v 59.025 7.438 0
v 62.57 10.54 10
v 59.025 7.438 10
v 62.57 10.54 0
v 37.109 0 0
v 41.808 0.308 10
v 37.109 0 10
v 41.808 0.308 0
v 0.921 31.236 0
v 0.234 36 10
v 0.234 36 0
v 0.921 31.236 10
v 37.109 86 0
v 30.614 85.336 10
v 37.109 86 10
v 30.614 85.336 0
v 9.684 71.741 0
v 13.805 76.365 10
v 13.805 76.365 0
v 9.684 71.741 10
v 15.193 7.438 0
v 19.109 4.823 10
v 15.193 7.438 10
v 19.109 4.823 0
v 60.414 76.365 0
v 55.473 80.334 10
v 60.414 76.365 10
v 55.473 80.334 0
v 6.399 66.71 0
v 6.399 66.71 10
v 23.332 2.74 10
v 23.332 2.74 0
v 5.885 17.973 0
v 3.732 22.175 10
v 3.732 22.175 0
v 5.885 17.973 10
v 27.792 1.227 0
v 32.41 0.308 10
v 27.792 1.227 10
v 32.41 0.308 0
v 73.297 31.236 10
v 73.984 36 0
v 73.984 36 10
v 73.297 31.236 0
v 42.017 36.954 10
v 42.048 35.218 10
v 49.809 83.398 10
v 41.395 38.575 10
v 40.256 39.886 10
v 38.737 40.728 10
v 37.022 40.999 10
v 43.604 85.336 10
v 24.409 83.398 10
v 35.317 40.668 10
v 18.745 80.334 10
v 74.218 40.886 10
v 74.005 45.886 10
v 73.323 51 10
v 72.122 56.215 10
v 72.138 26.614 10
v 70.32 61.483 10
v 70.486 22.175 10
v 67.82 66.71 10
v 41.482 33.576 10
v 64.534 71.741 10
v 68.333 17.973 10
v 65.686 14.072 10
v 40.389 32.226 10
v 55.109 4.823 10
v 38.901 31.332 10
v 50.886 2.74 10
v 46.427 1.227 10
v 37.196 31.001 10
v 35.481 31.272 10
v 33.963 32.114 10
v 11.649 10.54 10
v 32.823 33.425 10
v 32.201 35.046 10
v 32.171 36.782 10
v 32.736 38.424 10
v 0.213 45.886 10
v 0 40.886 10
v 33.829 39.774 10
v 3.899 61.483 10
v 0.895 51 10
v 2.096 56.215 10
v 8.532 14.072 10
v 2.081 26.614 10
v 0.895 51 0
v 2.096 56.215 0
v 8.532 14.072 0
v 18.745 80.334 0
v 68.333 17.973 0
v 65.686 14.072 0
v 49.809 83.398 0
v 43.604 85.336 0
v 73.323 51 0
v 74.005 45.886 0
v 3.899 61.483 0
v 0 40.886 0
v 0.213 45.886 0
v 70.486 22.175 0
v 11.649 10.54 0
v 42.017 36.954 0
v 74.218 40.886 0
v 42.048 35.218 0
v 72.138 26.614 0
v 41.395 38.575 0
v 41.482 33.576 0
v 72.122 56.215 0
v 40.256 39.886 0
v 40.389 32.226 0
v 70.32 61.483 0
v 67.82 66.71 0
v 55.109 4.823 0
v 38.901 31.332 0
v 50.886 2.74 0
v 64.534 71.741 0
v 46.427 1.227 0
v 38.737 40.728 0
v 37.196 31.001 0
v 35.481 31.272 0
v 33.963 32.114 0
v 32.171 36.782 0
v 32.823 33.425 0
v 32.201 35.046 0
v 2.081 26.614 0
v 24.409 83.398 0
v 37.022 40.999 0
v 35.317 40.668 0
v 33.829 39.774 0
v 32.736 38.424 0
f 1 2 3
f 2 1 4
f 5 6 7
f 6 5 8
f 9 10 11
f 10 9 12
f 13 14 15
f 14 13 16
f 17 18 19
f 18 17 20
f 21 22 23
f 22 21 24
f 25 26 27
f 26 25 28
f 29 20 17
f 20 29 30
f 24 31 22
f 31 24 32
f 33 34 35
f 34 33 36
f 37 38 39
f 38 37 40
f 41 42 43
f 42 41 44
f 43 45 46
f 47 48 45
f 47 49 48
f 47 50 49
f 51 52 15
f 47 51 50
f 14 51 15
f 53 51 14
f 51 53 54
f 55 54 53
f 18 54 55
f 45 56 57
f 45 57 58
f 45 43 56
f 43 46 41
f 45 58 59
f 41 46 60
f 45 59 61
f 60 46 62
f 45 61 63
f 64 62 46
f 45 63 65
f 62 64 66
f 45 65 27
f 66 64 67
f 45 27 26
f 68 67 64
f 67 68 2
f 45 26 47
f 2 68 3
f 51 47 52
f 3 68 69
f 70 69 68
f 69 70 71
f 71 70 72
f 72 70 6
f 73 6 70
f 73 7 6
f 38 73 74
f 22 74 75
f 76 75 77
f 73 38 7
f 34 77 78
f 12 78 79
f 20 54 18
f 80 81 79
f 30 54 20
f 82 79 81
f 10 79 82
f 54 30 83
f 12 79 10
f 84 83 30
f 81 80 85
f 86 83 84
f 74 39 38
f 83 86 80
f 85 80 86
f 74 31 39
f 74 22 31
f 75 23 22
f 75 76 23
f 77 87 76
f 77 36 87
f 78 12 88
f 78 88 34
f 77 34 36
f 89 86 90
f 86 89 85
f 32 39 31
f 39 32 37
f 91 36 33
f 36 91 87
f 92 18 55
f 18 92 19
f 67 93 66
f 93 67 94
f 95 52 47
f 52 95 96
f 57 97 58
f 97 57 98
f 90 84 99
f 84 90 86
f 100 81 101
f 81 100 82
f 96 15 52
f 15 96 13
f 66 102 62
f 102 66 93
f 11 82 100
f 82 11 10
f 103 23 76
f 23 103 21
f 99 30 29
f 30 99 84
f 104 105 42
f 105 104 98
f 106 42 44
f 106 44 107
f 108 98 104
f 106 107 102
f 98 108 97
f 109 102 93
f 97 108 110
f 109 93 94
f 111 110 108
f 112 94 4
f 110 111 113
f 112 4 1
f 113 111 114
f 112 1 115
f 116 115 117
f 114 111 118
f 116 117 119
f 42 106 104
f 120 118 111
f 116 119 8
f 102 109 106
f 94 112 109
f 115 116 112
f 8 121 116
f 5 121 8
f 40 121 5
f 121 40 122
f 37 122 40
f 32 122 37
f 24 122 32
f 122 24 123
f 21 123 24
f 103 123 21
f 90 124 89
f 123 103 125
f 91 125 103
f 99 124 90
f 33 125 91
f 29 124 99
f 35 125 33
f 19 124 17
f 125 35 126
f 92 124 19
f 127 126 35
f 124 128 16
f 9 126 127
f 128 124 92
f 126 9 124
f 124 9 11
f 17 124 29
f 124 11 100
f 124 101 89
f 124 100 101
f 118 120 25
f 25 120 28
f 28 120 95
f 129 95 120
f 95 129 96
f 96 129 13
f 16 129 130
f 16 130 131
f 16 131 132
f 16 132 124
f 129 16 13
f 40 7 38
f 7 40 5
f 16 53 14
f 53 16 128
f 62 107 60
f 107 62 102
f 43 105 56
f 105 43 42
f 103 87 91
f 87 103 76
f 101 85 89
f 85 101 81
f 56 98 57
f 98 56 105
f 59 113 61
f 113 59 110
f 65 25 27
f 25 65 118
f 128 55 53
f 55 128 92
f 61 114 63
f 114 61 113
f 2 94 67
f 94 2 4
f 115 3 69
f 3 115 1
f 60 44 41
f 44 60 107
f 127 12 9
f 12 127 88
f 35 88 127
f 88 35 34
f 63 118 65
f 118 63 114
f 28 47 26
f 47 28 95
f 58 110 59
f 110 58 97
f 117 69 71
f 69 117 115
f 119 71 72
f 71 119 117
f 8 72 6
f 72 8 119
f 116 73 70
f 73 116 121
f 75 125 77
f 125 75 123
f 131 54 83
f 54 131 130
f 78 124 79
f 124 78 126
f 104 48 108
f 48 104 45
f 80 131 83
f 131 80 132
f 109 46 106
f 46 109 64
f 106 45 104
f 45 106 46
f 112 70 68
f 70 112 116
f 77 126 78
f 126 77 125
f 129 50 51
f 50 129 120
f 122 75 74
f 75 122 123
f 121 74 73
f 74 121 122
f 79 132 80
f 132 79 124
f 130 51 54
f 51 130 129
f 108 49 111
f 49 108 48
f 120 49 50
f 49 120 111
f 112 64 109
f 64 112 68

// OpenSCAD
$fn = 32;

// ----------------------------------------------------------------------
// Cam plate: single_lobe cam, base R36
// ----------------------------------------------------------------------

// --- parameters (mm) ---
base_r = 36;              // base circle radius
lobe_h = 14;              // cam lobe rise
bore_r = 5;               // shaft bore radius
plate_t = 10;             // plate thickness, Z (extrusion height)

profile = [[73.984, 36], [74.218, 40.886], [74.005, 45.886], [73.323, 51], [72.122, 56.215], [70.32, 61.483], [67.82, 66.71], [64.534, 71.741], [60.414, 76.365], [55.473, 80.334], [49.809, 83.398], [43.604, 85.336], [37.109, 86], [30.614, 85.336], [24.409, 83.398], [18.745, 80.334], [13.805, 76.365], [9.684, 71.741], [6.399, 66.71], [3.899, 61.483], [2.096, 56.215], [0.895, 51], [0.213, 45.886], [0, 40.886], [0.234, 36], [0.921, 31.236], [2.081, 26.614], [3.732, 22.175], [5.885, 17.973], [8.532, 14.072], [11.649, 10.54], [15.193, 7.438], [19.109, 4.823], [23.332, 2.74], [27.792, 1.227], [32.41, 0.308], [37.109, 0], [41.808, 0.308], [46.427, 1.227], [50.886, 2.74], [55.109, 4.823], [59.025, 7.438], [62.57, 10.54], [65.686, 14.072], [68.333, 17.973], [70.486, 22.175], [72.138, 26.614], [73.297, 31.236]];  // primary outline, 48 points, counter clockwise
void_1 = [[42.017, 36.954], [41.395, 38.575], [40.256, 39.886], [38.737, 40.728], [37.022, 40.999], [35.317, 40.668], [33.829, 39.774], [32.736, 38.424], [32.171, 36.782], [32.201, 35.046], [32.823, 33.425], [33.963, 32.114], [35.481, 31.272], [37.196, 31.001], [38.901, 31.332], [40.389, 32.226], [41.482, 33.576], [42.048, 35.218]];  // shaft bore, 18 points

// --- the one profile operation ---
difference() {
  linear_extrude(height = plate_t) polygon(points = profile);
  translate([0, 0, -1])
    linear_extrude(height = plate_t + 2) polygon(points = void_1);
}
